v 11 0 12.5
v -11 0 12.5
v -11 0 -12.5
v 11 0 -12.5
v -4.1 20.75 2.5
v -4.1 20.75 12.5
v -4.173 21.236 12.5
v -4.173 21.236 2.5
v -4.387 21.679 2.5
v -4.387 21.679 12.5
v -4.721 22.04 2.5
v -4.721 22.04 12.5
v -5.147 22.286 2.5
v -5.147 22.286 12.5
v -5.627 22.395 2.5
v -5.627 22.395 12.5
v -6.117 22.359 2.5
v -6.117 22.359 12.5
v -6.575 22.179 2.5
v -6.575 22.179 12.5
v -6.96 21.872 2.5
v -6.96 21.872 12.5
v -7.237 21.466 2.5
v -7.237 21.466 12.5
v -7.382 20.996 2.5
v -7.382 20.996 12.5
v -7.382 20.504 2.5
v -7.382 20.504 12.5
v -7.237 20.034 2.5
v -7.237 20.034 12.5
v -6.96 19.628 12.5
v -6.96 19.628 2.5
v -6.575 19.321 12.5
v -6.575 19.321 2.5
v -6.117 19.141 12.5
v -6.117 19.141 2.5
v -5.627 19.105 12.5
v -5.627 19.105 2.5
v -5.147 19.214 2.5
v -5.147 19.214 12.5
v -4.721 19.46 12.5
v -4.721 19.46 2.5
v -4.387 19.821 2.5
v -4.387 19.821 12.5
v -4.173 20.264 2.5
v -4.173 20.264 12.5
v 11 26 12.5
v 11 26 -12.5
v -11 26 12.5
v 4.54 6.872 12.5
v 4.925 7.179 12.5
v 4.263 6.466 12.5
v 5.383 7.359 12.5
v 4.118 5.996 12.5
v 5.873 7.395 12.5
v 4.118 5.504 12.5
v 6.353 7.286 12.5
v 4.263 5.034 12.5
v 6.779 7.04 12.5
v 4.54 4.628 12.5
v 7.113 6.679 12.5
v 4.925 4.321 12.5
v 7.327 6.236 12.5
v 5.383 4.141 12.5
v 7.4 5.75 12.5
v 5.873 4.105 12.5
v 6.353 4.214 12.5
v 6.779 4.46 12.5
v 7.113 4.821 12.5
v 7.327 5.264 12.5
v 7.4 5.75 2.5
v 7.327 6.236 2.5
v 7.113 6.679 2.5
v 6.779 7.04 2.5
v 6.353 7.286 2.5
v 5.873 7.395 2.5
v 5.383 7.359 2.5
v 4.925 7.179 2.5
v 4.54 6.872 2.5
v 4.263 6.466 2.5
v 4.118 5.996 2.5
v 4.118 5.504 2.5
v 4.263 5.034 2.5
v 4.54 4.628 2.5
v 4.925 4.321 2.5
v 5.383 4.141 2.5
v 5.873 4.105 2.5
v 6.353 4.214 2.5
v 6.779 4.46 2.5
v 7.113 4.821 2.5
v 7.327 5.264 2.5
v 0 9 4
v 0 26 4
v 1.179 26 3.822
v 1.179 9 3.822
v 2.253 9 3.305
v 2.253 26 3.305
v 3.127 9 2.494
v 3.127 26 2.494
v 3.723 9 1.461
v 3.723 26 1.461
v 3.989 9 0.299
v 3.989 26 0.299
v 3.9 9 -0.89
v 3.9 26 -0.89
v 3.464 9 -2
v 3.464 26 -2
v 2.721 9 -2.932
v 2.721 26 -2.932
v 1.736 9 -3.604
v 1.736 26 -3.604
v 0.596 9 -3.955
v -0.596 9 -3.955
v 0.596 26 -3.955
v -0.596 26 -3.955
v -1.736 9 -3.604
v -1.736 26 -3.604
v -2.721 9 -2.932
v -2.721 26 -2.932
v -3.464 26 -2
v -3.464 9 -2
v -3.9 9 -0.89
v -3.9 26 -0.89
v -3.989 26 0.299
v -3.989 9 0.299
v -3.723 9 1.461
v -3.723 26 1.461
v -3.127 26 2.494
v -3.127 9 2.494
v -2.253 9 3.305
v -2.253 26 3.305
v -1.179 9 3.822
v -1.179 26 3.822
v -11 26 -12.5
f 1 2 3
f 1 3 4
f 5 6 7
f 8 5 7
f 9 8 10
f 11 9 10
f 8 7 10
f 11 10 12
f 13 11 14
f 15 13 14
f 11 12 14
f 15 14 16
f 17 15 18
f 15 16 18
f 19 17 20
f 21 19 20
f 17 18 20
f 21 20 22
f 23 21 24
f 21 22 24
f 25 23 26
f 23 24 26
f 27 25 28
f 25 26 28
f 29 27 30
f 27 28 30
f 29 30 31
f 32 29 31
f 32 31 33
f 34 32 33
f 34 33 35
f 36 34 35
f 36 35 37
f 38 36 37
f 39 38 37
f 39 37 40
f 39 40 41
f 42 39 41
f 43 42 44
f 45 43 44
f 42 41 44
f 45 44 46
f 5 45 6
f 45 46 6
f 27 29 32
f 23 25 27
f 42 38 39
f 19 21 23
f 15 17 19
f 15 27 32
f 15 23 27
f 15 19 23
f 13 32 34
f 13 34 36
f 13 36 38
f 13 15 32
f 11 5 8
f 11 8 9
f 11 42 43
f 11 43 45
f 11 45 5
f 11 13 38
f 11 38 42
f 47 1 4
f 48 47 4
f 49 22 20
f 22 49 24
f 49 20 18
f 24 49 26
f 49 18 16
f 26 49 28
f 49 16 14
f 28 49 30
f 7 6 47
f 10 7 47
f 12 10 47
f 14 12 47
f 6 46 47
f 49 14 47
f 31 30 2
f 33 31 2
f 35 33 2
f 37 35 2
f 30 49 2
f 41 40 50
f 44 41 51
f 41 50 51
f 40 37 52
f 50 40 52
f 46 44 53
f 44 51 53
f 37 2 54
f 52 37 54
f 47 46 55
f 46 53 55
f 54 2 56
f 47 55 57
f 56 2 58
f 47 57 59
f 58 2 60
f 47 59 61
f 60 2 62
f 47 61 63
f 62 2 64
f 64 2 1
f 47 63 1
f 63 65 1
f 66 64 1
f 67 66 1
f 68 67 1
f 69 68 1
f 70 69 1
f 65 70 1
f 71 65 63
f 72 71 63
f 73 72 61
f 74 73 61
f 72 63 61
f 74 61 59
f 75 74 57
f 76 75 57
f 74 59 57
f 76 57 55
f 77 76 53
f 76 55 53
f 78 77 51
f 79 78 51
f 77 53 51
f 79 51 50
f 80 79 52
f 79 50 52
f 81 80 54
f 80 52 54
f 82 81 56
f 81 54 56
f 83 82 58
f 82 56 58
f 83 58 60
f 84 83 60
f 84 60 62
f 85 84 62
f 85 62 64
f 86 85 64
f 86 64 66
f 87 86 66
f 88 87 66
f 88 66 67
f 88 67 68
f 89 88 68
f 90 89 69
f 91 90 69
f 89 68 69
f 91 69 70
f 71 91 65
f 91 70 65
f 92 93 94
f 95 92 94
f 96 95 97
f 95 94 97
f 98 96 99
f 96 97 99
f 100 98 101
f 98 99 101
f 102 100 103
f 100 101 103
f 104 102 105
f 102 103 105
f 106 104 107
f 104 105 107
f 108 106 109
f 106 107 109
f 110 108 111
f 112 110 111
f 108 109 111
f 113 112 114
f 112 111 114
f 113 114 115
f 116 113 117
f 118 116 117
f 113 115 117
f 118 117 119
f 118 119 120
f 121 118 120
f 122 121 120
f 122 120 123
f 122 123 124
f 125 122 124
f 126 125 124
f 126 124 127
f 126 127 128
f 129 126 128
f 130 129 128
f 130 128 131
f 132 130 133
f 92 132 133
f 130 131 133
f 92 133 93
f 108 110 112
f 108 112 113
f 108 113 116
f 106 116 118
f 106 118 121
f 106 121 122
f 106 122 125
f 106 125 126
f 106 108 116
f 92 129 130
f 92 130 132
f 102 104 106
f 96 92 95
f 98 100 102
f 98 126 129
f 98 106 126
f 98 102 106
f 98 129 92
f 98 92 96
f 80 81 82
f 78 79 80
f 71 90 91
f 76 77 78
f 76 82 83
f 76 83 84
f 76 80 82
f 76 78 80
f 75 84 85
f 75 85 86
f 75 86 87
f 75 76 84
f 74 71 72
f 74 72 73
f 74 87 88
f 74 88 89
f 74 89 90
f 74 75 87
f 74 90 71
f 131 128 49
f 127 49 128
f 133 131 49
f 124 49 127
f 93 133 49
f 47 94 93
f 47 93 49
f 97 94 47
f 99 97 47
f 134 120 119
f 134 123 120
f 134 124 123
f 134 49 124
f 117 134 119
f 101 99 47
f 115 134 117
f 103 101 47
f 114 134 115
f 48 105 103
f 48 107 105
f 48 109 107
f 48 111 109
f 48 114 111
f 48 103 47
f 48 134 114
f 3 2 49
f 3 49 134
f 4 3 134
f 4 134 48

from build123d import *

# Parameters (mm, degrees)
SKETCH1_W           = 22
SKETCH1_H           = 25
BOSS_EXTRUDE1_DEPTH = 26
SKETCH2_R           = 4
CUT_EXTRUDE2_DEPTH  = 17
SKETCH3_R           = 1.65
CUT_EXTRUDE3_DEPTH  = 10


with BuildPart() as part:
    # Sketch1 → Boss-Extrude1 (new body)
    with BuildSketch(Plane(origin=(0, 0, 0), x_dir=(1, 0, 0), z_dir=(0, 1, 0))):
        Rectangle(SKETCH1_W, SKETCH1_H)
    extrude(amount=BOSS_EXTRUDE1_DEPTH)

    # Sketch2 → Cut-Extrude2 (cut)
    with BuildSketch(Plane(origin=(0, 26, 0), x_dir=(1, 0, 0), z_dir=(0, 1, 0))):
        with Locations(Location((0, 0, 0), (0, 0, 270))):
            Circle(SKETCH2_R)
    extrude(amount=-CUT_EXTRUDE2_DEPTH, mode=Mode.SUBTRACT)

    # Sketch3 → Cut-Extrude3 (cut)
    with BuildSketch(Plane.XY.offset(12.5)):
        with Locations((-5.75, 20.75)):
            Circle(SKETCH3_R)
        with Locations((5.75, 5.75)):
            Circle(SKETCH3_R)
    extrude(amount=-CUT_EXTRUDE3_DEPTH, mode=Mode.SUBTRACT)


solid = part.part
